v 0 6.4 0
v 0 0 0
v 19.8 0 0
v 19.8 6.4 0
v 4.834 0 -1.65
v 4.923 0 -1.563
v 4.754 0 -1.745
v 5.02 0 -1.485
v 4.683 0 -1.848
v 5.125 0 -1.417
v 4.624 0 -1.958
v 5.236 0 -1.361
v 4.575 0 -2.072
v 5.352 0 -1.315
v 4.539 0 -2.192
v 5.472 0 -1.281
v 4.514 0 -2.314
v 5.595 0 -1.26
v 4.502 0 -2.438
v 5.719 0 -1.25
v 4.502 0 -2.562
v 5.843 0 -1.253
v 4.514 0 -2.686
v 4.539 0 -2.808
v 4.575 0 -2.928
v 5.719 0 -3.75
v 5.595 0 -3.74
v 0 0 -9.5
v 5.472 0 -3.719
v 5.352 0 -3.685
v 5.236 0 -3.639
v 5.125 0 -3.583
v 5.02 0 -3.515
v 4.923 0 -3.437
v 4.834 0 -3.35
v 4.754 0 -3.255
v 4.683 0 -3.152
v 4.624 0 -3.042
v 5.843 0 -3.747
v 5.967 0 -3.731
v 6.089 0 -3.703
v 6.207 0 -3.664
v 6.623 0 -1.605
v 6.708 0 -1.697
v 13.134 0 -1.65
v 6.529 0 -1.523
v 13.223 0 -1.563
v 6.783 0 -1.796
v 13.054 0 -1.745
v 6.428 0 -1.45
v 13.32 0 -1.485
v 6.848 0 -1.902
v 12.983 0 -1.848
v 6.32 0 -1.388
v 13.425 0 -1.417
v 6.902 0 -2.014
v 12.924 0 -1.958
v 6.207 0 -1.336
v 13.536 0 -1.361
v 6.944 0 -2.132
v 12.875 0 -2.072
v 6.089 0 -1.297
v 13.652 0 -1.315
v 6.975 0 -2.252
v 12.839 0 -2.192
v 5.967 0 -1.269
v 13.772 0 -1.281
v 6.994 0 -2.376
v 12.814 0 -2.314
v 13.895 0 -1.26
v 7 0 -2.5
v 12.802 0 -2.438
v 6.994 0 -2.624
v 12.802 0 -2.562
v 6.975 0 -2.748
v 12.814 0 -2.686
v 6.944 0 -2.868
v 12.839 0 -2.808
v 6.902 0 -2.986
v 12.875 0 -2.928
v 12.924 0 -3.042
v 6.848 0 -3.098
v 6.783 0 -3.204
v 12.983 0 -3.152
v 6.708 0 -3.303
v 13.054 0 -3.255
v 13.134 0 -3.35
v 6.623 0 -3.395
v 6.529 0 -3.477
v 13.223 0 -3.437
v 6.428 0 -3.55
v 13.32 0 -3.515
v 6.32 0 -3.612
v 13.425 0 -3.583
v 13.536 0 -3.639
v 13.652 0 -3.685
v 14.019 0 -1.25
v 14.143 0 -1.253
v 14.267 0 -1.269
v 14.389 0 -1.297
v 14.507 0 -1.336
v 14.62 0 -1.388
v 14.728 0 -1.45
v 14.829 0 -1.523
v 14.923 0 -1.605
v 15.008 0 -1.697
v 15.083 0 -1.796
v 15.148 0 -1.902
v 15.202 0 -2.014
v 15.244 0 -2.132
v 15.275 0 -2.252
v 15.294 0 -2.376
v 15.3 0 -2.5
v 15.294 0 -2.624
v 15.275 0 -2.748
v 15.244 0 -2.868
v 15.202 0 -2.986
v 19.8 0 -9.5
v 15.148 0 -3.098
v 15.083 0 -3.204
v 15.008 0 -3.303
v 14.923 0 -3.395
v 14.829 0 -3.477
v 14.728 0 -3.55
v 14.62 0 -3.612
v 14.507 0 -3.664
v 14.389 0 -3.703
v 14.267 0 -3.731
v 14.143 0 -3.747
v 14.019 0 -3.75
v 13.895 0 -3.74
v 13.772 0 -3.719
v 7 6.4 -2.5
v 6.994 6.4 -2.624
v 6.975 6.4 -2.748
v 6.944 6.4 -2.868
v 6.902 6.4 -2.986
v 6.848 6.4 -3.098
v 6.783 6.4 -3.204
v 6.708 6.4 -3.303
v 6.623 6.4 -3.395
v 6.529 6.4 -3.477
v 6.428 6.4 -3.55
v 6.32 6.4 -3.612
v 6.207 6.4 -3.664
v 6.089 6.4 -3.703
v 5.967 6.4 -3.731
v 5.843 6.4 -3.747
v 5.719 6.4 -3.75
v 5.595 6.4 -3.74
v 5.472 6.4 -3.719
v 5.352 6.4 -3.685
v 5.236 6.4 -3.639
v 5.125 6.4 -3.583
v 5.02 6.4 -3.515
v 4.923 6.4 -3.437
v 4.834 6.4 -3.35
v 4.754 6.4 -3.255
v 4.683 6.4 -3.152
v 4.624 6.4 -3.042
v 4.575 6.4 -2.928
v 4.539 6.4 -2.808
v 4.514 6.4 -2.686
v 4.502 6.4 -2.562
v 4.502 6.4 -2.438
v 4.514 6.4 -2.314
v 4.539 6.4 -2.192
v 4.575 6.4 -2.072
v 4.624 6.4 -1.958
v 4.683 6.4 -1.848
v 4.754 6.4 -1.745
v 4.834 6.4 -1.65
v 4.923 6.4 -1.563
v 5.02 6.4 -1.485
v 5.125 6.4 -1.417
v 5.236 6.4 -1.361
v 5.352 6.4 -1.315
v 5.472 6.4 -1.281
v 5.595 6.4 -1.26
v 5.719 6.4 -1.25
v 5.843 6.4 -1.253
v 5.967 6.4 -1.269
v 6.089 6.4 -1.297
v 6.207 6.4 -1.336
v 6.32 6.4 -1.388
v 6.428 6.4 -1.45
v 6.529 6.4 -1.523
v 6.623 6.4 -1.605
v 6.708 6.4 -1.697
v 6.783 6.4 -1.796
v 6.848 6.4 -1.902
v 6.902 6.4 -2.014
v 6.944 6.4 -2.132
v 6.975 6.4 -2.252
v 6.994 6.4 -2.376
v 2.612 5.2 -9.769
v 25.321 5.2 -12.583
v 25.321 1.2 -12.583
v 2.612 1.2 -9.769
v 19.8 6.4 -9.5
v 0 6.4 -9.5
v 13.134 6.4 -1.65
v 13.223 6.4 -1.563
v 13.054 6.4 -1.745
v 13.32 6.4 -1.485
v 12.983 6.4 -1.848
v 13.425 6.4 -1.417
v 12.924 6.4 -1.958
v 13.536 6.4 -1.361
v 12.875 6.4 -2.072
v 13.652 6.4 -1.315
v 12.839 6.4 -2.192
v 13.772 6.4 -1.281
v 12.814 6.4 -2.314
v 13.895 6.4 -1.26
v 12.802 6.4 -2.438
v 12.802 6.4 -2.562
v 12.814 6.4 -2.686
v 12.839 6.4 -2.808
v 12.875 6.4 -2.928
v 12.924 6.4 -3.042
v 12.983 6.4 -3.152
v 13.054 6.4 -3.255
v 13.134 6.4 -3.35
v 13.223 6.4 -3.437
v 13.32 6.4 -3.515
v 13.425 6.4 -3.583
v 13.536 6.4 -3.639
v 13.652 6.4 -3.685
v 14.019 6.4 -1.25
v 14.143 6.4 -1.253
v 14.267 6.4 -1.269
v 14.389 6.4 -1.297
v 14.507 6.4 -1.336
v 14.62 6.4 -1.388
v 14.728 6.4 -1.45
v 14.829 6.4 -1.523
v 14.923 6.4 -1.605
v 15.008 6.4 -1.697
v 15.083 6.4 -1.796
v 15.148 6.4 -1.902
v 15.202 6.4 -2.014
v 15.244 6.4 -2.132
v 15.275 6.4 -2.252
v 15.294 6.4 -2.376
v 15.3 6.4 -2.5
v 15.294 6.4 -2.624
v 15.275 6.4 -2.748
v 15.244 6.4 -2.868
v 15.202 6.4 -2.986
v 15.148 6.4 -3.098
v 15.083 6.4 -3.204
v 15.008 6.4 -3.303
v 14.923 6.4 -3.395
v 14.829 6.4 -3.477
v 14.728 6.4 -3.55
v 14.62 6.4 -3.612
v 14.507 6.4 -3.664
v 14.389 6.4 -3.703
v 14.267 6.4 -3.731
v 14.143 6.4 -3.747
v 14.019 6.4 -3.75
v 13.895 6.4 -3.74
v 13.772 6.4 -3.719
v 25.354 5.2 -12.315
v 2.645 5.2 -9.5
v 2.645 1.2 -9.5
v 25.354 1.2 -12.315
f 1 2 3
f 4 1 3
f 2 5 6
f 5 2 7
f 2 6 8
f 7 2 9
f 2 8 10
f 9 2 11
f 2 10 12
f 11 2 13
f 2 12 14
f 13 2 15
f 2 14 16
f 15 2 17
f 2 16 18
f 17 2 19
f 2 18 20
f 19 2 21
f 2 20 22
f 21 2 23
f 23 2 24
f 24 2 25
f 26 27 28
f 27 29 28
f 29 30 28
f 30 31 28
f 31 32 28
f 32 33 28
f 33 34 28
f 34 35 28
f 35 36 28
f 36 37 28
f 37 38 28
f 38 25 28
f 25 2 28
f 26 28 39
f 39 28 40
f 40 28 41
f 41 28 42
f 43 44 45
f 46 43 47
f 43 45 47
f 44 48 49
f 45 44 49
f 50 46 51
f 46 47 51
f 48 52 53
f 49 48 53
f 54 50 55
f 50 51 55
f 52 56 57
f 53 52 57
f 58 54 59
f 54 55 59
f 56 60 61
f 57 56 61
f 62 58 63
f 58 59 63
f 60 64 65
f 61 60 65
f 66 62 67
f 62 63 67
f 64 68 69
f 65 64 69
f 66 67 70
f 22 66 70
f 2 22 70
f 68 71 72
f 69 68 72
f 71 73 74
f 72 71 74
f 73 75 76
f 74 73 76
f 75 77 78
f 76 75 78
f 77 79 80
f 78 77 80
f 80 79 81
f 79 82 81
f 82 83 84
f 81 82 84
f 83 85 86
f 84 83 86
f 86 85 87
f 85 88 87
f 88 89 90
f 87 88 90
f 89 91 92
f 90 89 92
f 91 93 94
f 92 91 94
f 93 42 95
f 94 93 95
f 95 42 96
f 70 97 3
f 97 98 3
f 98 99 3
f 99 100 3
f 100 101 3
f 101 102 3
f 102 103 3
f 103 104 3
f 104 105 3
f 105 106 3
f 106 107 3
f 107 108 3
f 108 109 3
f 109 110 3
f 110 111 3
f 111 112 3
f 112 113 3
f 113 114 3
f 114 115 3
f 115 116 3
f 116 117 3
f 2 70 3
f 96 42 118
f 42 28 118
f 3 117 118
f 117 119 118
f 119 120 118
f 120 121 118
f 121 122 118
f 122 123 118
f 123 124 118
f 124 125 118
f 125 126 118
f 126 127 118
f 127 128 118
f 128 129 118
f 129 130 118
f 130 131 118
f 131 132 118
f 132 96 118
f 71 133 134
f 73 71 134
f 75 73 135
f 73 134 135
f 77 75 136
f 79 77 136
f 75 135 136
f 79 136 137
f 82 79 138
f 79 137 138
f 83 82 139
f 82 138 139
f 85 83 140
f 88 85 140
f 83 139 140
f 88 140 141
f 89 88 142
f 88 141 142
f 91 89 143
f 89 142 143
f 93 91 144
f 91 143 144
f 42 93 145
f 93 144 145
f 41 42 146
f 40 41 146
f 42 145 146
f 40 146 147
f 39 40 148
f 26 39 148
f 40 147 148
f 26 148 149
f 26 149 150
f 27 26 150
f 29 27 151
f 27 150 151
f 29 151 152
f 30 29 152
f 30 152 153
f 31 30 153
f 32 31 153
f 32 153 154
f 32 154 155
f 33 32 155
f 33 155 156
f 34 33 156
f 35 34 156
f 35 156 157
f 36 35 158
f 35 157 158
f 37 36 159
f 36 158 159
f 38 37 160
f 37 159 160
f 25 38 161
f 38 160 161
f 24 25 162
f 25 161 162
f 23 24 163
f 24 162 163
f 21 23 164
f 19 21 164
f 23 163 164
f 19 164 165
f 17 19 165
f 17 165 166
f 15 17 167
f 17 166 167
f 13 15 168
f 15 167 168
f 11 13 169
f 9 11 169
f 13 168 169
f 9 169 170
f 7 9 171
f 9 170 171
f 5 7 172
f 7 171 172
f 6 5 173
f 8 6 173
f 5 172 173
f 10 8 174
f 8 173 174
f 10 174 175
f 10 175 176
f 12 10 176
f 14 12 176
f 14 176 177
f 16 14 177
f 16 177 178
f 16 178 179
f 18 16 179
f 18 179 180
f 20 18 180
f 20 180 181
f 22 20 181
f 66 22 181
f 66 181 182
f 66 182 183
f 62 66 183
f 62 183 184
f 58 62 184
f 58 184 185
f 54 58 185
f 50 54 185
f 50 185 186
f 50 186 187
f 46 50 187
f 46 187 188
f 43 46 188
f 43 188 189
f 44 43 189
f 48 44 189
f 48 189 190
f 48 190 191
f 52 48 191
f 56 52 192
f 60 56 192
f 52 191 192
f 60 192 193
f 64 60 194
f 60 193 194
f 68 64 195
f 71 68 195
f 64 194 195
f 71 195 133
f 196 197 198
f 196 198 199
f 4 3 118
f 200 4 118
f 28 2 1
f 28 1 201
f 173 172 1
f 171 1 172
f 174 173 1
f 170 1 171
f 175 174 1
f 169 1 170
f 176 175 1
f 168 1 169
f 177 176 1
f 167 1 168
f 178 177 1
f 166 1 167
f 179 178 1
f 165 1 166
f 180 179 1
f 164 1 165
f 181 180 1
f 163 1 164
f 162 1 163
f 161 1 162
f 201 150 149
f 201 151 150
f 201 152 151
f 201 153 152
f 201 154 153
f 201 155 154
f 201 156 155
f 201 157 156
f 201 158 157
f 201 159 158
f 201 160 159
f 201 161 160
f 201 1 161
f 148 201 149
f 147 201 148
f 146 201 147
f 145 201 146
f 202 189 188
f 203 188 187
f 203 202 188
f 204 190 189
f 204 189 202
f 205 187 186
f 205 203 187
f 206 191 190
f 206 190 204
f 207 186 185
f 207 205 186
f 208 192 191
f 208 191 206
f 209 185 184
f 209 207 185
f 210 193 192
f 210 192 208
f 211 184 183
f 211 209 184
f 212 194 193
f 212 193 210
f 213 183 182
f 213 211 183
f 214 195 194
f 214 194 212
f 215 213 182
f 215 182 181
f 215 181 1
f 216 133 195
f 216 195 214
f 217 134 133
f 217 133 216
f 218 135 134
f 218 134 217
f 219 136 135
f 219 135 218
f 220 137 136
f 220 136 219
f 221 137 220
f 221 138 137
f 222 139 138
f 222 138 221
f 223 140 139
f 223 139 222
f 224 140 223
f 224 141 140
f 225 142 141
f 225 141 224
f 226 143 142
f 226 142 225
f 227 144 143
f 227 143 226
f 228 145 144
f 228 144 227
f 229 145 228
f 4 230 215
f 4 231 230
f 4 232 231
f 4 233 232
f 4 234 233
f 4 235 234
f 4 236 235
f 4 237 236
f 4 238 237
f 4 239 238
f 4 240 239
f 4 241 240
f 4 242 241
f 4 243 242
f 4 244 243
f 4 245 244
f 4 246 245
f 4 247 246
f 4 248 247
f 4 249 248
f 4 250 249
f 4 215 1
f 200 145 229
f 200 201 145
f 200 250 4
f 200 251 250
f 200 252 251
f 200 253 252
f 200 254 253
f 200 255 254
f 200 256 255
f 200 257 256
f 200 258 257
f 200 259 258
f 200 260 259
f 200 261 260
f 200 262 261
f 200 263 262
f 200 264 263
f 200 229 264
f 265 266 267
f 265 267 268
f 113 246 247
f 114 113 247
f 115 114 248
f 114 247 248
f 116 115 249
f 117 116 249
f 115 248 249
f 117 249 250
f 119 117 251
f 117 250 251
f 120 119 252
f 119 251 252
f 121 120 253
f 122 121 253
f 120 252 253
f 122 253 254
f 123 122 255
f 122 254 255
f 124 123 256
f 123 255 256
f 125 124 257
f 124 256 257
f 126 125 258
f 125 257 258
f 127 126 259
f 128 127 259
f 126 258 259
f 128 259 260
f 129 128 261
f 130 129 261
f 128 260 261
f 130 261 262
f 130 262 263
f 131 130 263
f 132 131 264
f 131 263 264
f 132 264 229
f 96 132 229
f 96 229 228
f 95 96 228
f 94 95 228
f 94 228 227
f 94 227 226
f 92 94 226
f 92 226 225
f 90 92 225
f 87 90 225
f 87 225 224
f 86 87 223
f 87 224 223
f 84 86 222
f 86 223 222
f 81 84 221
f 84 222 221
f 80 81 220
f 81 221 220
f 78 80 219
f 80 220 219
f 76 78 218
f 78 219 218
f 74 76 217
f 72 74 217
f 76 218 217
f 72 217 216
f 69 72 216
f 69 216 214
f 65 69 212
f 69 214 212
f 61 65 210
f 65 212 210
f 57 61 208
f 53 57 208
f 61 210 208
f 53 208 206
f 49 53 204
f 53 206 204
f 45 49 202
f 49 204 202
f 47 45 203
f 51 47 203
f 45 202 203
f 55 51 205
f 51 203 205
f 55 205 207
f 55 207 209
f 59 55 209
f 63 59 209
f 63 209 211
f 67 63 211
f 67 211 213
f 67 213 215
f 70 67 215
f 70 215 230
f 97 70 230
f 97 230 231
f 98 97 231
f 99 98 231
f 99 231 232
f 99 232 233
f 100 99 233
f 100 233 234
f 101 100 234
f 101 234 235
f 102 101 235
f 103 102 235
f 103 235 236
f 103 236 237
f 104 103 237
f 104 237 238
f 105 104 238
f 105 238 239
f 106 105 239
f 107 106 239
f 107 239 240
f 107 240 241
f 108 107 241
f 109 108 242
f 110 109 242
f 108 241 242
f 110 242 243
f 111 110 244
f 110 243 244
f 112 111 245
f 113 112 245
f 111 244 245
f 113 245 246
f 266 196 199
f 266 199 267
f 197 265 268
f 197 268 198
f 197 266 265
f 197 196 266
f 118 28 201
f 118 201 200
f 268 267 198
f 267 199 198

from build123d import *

# Parameters (mm, degrees)
SKETCH_1_W          = 19.8
SKETCH_1_H          = 9.5
EXTRUDE_1_DEPTH     = 6.4
SKETCH_2_R          = 1.25
CUT_EXTRUDE_1_DEPTH = 6.4
EXTRUDE_START       = -1.2
EXTRUDE_2_DEPTH     = 4


with BuildPart() as part:
    # 草圖1 → 填料-伸長1 (new body)
    with BuildSketch(Plane(origin=(0, 0, 0), x_dir=(1, 0, 0), z_dir=(0, 1, 0))):
        with Locations((9.9, 4.75)):
            Rectangle(SKETCH_1_W, SKETCH_1_H)
    extrude(amount=EXTRUDE_1_DEPTH)

    # 草圖2 → 除料-伸長1 (cut)
    with BuildSketch(Plane(origin=(0, 6.4, 0), x_dir=(1, 0, 0), z_dir=(0, 1, 0))):
        with Locations((5.75, 2.5)):
            Circle(SKETCH_2_R)
        with Locations((14.05, 2.5)):
            Circle(SKETCH_2_R)
    extrude(amount=-CUT_EXTRUDE_1_DEPTH, mode=Mode.SUBTRACT)


with BuildPart() as body_2:
    # 草圖3 → 填料-伸長2 (new body)
    with BuildSketch(Plane(origin=(0, 6.4, 0), x_dir=(1, 0, 0), z_dir=(0, 1, 0)).offset(EXTRUDE_START)):
        Polygon((2.644966483, 9.5), (25.353811231, 12.314699581), (25.320517467, 12.583311873), (2.61167272, 9.768612292), align=None)
    extrude(amount=-EXTRUDE_2_DEPTH)


solid = Compound([part.part, body_2.part])
